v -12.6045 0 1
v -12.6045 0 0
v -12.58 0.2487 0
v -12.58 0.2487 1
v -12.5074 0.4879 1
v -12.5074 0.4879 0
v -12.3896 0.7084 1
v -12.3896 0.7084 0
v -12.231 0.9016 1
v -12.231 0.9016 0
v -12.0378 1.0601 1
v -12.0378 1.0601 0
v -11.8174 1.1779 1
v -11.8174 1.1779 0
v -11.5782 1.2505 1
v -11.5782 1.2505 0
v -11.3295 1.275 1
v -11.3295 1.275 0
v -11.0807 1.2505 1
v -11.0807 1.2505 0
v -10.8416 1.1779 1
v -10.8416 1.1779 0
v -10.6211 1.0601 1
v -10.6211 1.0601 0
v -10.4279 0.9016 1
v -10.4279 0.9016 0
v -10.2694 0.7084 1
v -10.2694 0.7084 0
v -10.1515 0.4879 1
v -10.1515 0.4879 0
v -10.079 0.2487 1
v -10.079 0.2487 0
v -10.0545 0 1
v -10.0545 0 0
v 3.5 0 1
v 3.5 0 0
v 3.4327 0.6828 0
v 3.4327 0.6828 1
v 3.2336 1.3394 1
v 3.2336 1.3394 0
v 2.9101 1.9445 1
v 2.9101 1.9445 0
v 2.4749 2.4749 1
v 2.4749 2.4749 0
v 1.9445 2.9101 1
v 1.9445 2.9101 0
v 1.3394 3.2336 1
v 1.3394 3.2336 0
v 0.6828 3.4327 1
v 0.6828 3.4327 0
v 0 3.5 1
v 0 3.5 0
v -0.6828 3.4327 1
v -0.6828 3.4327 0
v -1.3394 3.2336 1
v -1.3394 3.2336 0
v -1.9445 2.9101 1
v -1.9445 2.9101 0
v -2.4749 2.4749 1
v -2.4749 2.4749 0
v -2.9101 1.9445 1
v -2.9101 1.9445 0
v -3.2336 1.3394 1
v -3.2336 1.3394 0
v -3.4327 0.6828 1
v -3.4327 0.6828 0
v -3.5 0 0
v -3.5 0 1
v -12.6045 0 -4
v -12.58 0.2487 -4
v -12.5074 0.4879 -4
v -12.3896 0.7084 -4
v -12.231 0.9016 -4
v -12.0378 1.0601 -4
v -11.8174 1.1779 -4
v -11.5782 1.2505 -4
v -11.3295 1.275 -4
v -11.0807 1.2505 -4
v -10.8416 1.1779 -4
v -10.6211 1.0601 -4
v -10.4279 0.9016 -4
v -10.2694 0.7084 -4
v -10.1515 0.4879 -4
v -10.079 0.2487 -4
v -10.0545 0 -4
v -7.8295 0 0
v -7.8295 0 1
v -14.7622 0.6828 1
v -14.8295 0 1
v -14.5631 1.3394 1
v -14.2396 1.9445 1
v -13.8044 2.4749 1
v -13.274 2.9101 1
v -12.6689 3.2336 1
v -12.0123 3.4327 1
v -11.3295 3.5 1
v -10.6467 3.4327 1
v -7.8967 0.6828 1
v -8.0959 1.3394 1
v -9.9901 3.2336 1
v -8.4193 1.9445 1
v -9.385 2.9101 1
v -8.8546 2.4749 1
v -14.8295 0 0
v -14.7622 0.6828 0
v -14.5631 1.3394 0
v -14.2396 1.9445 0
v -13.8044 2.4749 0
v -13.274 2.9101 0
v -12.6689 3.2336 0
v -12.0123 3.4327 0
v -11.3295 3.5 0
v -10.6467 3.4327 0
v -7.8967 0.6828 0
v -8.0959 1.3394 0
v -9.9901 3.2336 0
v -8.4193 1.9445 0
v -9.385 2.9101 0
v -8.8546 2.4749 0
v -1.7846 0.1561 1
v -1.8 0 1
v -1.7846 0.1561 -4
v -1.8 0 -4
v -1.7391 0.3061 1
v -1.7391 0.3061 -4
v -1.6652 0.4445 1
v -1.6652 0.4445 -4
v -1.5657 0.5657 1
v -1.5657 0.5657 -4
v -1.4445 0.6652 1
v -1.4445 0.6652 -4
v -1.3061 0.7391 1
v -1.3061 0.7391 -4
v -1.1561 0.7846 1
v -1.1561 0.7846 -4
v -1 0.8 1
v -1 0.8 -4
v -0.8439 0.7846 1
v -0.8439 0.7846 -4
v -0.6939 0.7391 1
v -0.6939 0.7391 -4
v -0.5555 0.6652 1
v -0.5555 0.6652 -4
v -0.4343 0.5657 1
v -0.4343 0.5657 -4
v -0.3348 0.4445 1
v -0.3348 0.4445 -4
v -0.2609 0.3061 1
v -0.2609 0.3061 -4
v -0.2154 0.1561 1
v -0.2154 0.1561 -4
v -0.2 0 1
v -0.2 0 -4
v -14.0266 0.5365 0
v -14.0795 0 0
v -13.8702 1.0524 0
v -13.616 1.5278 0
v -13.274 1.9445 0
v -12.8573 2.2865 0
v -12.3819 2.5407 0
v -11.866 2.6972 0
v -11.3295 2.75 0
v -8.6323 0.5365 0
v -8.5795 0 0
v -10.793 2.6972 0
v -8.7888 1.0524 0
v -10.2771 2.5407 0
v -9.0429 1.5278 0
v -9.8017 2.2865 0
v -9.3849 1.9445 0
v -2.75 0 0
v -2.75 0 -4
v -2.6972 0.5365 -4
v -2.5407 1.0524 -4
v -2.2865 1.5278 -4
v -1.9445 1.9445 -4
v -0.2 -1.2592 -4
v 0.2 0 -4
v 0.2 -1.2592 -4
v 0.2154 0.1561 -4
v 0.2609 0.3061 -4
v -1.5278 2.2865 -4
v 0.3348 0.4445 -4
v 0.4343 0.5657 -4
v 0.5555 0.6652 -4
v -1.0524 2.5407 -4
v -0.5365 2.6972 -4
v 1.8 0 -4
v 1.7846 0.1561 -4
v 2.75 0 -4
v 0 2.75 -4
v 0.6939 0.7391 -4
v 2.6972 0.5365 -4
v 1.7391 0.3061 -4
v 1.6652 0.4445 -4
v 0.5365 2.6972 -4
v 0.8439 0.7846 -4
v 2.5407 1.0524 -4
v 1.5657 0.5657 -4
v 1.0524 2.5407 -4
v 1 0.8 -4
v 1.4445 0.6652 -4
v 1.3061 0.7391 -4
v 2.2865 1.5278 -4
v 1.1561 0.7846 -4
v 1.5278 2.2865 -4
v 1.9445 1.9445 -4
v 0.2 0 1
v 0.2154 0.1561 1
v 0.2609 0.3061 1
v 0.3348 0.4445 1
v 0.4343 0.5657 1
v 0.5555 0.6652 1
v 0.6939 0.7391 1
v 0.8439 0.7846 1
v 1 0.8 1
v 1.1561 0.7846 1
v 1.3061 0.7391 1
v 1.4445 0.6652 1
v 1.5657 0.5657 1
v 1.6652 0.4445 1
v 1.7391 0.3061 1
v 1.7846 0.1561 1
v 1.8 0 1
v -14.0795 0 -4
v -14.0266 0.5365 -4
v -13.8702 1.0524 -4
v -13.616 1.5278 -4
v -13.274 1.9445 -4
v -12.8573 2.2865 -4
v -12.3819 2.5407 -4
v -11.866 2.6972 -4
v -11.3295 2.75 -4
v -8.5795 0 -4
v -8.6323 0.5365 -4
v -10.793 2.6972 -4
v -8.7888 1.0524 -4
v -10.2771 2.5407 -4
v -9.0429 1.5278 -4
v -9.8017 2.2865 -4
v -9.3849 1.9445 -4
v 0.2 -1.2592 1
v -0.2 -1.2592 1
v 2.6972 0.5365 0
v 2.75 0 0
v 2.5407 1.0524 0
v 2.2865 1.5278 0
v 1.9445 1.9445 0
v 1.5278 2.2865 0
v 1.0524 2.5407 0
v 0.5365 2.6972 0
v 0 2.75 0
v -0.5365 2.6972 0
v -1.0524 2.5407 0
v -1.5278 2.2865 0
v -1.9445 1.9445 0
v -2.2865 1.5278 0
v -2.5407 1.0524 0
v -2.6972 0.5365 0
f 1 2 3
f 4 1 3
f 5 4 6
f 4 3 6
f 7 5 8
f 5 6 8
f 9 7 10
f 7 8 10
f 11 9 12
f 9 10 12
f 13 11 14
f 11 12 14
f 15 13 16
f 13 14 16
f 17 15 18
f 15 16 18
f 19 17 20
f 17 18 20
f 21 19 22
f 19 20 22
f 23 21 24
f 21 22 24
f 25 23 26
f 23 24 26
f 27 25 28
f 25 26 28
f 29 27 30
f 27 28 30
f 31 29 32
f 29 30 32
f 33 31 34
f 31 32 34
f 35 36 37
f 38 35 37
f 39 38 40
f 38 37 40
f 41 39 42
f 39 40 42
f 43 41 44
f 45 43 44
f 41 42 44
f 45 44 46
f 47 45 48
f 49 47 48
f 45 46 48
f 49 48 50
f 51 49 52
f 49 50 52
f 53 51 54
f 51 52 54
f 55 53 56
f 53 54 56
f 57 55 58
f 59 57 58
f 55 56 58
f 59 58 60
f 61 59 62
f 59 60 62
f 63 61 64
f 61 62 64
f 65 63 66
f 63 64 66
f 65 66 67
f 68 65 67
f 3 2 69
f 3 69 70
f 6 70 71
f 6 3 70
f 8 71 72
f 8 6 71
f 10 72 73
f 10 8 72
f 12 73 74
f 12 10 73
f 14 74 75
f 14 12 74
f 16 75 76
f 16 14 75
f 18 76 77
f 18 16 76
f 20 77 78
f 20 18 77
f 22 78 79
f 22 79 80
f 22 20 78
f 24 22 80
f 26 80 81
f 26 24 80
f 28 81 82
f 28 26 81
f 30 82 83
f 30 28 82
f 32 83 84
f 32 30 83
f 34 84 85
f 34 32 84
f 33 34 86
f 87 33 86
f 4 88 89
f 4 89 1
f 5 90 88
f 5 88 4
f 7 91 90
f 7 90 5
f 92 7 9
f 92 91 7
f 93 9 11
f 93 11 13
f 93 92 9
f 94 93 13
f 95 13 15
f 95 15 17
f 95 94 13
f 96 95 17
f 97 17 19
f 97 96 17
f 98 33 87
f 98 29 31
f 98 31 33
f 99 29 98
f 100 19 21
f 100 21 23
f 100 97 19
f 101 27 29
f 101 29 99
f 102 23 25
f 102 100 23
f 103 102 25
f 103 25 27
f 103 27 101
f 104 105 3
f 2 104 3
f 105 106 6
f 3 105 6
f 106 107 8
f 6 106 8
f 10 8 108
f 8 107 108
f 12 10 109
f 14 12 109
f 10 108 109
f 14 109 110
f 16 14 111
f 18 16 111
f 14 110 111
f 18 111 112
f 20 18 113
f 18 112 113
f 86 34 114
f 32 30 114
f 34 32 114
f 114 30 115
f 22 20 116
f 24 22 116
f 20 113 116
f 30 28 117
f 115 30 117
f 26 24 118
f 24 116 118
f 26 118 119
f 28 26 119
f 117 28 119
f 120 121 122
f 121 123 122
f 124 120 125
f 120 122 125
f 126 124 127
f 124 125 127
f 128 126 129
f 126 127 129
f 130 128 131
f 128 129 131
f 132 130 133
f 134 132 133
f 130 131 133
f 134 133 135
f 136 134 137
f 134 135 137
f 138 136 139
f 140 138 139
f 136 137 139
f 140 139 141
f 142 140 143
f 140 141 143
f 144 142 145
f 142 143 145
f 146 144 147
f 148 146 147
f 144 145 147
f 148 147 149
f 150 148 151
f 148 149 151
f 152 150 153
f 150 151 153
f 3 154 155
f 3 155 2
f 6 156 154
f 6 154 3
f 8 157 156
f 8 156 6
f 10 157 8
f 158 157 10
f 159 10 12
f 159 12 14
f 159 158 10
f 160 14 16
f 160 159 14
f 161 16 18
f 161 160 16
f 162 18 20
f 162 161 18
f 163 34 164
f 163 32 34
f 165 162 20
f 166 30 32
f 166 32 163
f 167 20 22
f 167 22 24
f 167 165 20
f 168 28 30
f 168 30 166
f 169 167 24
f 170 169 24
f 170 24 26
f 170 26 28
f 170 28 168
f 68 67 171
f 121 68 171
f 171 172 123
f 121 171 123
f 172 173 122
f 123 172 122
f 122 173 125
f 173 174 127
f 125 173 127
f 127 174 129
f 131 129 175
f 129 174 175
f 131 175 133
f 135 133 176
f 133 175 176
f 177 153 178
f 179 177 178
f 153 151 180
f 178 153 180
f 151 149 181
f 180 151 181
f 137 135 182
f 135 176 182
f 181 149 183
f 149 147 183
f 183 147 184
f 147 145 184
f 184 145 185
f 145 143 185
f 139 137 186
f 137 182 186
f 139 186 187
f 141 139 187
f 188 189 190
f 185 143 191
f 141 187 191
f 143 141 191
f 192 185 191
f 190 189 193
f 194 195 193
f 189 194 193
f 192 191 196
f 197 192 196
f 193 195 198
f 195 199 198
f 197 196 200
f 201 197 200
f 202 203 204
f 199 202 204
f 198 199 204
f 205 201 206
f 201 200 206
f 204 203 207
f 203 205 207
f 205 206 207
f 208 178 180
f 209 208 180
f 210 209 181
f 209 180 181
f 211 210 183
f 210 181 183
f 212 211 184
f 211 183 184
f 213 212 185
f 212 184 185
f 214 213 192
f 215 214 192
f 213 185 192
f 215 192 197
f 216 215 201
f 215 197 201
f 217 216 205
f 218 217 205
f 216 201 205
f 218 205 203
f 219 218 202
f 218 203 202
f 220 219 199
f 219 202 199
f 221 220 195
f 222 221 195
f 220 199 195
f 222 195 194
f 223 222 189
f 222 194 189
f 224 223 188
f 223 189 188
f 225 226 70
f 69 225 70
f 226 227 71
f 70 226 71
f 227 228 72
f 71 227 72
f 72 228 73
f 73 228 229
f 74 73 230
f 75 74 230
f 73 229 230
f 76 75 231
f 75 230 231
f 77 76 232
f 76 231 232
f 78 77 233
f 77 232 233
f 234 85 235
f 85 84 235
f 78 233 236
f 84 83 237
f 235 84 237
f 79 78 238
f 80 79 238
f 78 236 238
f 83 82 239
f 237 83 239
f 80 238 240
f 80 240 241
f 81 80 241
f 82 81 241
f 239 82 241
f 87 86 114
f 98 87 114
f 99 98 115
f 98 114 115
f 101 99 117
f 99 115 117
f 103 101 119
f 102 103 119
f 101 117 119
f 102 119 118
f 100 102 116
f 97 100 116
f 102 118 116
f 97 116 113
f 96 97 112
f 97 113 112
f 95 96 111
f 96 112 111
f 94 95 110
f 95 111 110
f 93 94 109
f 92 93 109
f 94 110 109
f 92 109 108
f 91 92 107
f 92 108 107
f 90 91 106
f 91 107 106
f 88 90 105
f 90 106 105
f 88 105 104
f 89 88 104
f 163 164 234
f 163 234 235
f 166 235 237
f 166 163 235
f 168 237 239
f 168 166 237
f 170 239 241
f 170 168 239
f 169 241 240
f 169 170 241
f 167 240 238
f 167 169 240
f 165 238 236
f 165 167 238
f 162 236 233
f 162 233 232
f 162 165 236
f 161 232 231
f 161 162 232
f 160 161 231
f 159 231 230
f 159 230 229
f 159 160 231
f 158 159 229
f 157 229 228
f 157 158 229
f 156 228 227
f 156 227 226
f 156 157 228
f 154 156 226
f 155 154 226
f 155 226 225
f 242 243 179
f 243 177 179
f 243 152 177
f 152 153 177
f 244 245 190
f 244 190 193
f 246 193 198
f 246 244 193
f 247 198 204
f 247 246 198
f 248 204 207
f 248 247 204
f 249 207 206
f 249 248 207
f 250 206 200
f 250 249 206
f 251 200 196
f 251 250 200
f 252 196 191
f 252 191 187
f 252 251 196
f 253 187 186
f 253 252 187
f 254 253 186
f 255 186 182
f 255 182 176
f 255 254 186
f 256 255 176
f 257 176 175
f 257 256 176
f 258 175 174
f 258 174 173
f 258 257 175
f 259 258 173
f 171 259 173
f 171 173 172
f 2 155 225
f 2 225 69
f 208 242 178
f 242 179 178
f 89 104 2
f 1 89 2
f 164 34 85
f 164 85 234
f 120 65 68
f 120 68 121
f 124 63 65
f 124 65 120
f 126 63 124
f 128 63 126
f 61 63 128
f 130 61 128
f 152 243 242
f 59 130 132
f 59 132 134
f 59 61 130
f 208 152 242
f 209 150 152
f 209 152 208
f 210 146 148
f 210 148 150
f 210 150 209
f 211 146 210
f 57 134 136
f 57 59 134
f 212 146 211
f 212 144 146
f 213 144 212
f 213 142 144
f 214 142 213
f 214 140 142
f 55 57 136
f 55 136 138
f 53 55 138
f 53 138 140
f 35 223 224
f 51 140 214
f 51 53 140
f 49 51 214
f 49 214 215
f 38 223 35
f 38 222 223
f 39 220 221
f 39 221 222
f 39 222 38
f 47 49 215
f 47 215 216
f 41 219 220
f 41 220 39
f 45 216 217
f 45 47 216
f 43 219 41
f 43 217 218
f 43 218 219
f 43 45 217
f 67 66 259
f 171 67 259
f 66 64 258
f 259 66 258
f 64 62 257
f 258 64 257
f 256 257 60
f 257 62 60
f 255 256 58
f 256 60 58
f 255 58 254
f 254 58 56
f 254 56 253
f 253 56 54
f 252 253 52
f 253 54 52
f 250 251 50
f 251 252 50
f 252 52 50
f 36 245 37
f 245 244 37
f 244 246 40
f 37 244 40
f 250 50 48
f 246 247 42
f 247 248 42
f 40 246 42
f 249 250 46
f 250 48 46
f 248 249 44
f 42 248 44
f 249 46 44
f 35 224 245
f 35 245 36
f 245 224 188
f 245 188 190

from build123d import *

# Parameters (mm, degrees)
F3_DEPTH = 4
F4_DEPTH = 1
F5_DEPTH = 4
F6_DEPTH = 1


with BuildPart() as f3:
    # F2 (on Top) → F3 (new body)
    with BuildSketch(Plane.XY):
        with BuildLine():
            Line((1.8, 0), (2.75, 0))
            ThreePointArc((2.75, 0), (0, 2.75), (-2.75, 0))
            Line((-2.75, 0), (-1.8, 0))
            ThreePointArc((-1.8, 0), (-1, 0.8), (-0.2, 0))
            Line((-0.2, 0), (-0.2, -1.2592160259))
            Line((-0.2, -1.2592160259), (0.2, -1.2592160259))
            Line((0.2, -1.2592160259), (0.2, 0))
            ThreePointArc((0.2, 0), (1, 0.8), (1.8, 0))
        make_face()
    extrude(amount=-F3_DEPTH)

    # F2 (on Top) → F4 (join)
    with BuildSketch(Plane.XY):
        with BuildLine():
            ThreePointArc((-2.75, 0), (0, 2.75), (2.75, 0))
            Line((2.75, 0), (3.5, 0))
            ThreePointArc((3.5, 0), (0, 3.5), (-3.5, 0))
            Line((-3.5, 0), (-2.75, 0))
        make_face()
        with BuildLine():
            Line((1.8, 0), (2.75, 0))
            ThreePointArc((2.75, 0), (0, 2.75), (-2.75, 0))
            Line((-2.75, 0), (-1.8, 0))
            ThreePointArc((-1.8, 0), (-1, 0.8), (-0.2, 0))
            Line((-0.2, 0), (-0.2, -1.2592160259))
            Line((-0.2, -1.2592160259), (0.2, -1.2592160259))
            Line((0.2, -1.2592160259), (0.2, 0))
            ThreePointArc((0.2, 0), (1, 0.8), (1.8, 0))
        make_face()
    extrude(amount=F4_DEPTH)


with BuildPart() as f5:
    # F2 (on Top) → F5 (new body)
    with BuildSketch(Plane.XY):
        with BuildLine():
            Line((-10.0544823095, 0), (-8.5794823095, 0))
            ThreePointArc((-8.5794823095, 0), (-11.3294823095, 2.75), (-14.0794823095, 0))
            Line((-14.0794823095, 0), (-12.6044823095, 0))
            ThreePointArc((-12.6044823095, 0), (-11.3294823095, 1.275), (-10.0544823095, 0))
        make_face()
    extrude(amount=-F5_DEPTH)


with BuildPart() as f6:
    # F2 (on Top) → F6 (new body)
    with BuildSketch(Plane.XY):
        with BuildLine():
            Line((-10.0544823095, 0), (-8.5794823095, 0))
            ThreePointArc((-8.5794823095, 0), (-11.3294823095, 2.75), (-14.0794823095, 0))
            Line((-14.0794823095, 0), (-12.6044823095, 0))
            ThreePointArc((-12.6044823095, 0), (-11.3294823095, 1.275), (-10.0544823095, 0))
        make_face()
        with BuildLine():
            ThreePointArc((-14.0794823095, 0), (-11.3294823095, 2.75), (-8.5794823095, 0))
            Line((-8.5794823095, 0), (-7.8294823095, 0))
            ThreePointArc((-7.8294823095, 0), (-11.3294823095, 3.5), (-14.8294823095, 0))
            Line((-14.8294823095, 0), (-14.0794823095, 0))
        make_face()
    extrude(amount=F6_DEPTH)


solid = Compound([f3.part, f5.part, f6.part])
